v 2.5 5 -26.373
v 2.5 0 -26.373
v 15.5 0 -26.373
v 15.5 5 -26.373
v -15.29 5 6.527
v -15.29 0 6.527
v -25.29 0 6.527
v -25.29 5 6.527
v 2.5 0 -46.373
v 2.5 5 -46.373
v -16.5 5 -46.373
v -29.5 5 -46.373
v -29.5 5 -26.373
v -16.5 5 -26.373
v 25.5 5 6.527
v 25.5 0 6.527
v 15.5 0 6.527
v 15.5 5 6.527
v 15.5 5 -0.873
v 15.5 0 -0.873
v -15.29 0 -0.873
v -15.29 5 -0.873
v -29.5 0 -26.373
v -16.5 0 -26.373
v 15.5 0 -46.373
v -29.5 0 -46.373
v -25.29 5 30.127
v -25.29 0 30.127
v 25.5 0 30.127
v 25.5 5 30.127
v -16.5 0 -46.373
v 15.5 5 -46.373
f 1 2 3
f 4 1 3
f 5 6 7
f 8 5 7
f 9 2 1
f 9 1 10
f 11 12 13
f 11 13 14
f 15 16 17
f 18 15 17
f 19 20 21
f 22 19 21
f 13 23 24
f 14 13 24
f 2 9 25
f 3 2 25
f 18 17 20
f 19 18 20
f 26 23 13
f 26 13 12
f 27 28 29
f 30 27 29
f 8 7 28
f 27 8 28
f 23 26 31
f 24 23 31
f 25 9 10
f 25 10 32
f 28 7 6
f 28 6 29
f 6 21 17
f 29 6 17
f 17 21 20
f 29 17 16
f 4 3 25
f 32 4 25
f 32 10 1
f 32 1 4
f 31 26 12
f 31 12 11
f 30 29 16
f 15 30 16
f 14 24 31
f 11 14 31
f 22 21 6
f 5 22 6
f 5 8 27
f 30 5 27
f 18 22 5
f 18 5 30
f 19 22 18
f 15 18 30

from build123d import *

# Parameters (mm, degrees)
BOSS_EXTRUDE1_DEPTH   = 5
SKETCH1_W             = 13
SKETCH1_H             = 20
BOSS_EXTRUDE1_2_DEPTH = 5
BOSS_EXTRUDE1_3_DEPTH = 5


with BuildPart() as part:
    # Sketch1 → Boss-Extrude1 (new body)
    with BuildSketch(Plane(origin=(0, 0, 0), x_dir=(1, 0, 0), z_dir=(0, 1, 0))):
        Polygon((-15.28967138, -6.526896022), (-25.28967138, -6.526896022), (-25.28967138, -30.126896022), (25.5, -30.126896022), (25.5, -6.526896022), (15.5, -6.526896022), (15.5, 0.873103978), (-15.28967138, 0.873103978), align=None)
    extrude(amount=BOSS_EXTRUDE1_DEPTH)


with BuildPart() as body_2:
    # Sketch1 → Boss-Extrude1 2 (new body)
    with BuildSketch(Plane(origin=(0, 0, 0), x_dir=(1, 0, 0), z_dir=(0, 1, 0))):
        with Locations((-23, 36.373103978)):
            Rectangle(SKETCH1_W, SKETCH1_H)
    extrude(amount=BOSS_EXTRUDE1_2_DEPTH)


with BuildPart() as body_3:
    # Sketch1 → Boss-Extrude1 3 (new body)
    with BuildSketch(Plane(origin=(0, 0, 0), x_dir=(1, 0, 0), z_dir=(0, 1, 0))):
        with Locations((9, 36.373103978)):
            Rectangle(SKETCH1_W, SKETCH1_H)
    extrude(amount=BOSS_EXTRUDE1_3_DEPTH)


solid = Compound([part.part, body_2.part, body_3.part])
